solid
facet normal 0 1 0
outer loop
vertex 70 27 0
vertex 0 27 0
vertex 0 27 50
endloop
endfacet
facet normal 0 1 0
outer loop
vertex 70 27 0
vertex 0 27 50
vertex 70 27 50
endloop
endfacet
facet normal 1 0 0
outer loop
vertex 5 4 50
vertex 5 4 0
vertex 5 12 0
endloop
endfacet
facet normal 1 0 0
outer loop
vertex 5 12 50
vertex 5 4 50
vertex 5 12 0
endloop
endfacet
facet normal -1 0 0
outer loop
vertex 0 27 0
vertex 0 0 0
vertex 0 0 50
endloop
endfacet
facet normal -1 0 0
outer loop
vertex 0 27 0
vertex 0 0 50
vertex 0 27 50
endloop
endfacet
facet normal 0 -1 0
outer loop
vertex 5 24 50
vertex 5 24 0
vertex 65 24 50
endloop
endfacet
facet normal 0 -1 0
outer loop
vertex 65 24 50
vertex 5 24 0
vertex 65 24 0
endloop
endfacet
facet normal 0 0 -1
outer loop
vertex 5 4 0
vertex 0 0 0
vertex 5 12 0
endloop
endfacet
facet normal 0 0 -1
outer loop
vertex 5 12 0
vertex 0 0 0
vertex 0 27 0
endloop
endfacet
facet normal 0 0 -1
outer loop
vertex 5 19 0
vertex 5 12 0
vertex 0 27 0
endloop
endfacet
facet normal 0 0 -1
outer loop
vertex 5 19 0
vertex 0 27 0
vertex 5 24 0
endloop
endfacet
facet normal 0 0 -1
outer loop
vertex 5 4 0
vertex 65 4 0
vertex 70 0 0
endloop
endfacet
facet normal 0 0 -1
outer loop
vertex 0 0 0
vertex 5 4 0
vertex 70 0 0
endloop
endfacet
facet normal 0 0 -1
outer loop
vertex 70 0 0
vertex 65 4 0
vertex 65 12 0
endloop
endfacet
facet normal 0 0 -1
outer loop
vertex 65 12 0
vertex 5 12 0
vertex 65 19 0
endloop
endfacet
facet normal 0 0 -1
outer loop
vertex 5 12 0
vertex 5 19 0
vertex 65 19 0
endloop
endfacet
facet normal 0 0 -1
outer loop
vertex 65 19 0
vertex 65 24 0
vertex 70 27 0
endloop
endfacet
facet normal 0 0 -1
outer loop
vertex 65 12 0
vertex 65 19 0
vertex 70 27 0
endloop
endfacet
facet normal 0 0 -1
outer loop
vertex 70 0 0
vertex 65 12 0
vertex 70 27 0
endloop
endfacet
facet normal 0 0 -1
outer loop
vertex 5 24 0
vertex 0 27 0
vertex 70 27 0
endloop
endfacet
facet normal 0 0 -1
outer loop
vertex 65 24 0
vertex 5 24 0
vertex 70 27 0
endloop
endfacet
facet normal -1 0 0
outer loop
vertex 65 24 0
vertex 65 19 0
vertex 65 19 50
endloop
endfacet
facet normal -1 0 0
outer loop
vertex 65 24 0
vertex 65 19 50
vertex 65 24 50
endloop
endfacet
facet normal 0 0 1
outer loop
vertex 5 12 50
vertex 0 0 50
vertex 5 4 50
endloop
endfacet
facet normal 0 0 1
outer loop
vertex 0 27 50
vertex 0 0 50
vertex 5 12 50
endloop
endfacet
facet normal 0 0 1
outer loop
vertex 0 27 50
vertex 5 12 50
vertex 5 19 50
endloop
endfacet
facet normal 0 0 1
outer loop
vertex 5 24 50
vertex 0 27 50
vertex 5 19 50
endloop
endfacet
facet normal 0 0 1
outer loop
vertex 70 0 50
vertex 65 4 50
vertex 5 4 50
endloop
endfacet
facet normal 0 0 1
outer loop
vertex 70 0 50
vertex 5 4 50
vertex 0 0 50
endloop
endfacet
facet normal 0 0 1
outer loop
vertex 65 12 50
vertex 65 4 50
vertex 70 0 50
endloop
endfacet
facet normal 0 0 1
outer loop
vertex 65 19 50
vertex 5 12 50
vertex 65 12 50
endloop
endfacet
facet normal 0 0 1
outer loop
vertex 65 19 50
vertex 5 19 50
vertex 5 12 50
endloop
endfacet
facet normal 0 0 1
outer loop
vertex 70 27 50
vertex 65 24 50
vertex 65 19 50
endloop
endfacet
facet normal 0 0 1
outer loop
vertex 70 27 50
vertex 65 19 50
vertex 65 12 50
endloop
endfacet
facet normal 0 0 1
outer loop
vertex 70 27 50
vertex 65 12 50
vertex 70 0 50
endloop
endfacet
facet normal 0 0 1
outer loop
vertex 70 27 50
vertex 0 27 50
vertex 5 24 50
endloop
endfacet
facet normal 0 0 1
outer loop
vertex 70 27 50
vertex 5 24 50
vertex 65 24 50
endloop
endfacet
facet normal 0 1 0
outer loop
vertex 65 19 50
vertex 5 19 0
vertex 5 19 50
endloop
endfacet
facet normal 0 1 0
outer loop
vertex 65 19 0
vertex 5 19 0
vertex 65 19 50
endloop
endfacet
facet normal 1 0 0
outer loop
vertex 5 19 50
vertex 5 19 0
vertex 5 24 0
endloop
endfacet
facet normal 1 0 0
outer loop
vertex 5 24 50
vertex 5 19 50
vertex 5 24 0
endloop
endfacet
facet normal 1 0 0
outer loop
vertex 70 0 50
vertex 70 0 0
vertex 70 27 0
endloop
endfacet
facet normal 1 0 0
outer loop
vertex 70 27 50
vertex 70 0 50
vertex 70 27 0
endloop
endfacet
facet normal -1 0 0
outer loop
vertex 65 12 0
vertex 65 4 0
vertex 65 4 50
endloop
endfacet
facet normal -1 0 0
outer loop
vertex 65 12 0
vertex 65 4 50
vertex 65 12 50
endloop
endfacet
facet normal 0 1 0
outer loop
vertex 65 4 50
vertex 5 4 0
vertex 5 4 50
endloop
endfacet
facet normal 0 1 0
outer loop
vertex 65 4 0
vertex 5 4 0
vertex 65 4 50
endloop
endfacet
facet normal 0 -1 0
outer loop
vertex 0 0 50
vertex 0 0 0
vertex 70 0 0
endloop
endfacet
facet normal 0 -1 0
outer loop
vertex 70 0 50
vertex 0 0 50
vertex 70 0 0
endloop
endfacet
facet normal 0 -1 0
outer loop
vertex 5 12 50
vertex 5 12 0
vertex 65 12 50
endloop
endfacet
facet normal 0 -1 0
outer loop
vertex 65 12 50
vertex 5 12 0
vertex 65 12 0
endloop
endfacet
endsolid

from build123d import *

# Parameters (mm, degrees)
SKETCH2_W           = 70
SKETCH2_H           = 27
SKETCH2_W_2         = 60
SKETCH2_H_2         = 8
SKETCH2_H_3         = 5
BOSS_EXTRUDE1_DEPTH = 50


with BuildPart() as part:
    # Sketch2 → Boss-Extrude1 (new body)
    with BuildSketch(Plane.XY):
        with Locations((35, 13.5)):
            Rectangle(SKETCH2_W, SKETCH2_H)
        with Locations((35, 8)):
            Rectangle(SKETCH2_W_2, SKETCH2_H_2, mode=Mode.SUBTRACT)
        with Locations((35, 21.5)):
            Rectangle(SKETCH2_W_2, SKETCH2_H_3, mode=Mode.SUBTRACT)
    extrude(amount=BOSS_EXTRUDE1_DEPTH)


solid = part.part
